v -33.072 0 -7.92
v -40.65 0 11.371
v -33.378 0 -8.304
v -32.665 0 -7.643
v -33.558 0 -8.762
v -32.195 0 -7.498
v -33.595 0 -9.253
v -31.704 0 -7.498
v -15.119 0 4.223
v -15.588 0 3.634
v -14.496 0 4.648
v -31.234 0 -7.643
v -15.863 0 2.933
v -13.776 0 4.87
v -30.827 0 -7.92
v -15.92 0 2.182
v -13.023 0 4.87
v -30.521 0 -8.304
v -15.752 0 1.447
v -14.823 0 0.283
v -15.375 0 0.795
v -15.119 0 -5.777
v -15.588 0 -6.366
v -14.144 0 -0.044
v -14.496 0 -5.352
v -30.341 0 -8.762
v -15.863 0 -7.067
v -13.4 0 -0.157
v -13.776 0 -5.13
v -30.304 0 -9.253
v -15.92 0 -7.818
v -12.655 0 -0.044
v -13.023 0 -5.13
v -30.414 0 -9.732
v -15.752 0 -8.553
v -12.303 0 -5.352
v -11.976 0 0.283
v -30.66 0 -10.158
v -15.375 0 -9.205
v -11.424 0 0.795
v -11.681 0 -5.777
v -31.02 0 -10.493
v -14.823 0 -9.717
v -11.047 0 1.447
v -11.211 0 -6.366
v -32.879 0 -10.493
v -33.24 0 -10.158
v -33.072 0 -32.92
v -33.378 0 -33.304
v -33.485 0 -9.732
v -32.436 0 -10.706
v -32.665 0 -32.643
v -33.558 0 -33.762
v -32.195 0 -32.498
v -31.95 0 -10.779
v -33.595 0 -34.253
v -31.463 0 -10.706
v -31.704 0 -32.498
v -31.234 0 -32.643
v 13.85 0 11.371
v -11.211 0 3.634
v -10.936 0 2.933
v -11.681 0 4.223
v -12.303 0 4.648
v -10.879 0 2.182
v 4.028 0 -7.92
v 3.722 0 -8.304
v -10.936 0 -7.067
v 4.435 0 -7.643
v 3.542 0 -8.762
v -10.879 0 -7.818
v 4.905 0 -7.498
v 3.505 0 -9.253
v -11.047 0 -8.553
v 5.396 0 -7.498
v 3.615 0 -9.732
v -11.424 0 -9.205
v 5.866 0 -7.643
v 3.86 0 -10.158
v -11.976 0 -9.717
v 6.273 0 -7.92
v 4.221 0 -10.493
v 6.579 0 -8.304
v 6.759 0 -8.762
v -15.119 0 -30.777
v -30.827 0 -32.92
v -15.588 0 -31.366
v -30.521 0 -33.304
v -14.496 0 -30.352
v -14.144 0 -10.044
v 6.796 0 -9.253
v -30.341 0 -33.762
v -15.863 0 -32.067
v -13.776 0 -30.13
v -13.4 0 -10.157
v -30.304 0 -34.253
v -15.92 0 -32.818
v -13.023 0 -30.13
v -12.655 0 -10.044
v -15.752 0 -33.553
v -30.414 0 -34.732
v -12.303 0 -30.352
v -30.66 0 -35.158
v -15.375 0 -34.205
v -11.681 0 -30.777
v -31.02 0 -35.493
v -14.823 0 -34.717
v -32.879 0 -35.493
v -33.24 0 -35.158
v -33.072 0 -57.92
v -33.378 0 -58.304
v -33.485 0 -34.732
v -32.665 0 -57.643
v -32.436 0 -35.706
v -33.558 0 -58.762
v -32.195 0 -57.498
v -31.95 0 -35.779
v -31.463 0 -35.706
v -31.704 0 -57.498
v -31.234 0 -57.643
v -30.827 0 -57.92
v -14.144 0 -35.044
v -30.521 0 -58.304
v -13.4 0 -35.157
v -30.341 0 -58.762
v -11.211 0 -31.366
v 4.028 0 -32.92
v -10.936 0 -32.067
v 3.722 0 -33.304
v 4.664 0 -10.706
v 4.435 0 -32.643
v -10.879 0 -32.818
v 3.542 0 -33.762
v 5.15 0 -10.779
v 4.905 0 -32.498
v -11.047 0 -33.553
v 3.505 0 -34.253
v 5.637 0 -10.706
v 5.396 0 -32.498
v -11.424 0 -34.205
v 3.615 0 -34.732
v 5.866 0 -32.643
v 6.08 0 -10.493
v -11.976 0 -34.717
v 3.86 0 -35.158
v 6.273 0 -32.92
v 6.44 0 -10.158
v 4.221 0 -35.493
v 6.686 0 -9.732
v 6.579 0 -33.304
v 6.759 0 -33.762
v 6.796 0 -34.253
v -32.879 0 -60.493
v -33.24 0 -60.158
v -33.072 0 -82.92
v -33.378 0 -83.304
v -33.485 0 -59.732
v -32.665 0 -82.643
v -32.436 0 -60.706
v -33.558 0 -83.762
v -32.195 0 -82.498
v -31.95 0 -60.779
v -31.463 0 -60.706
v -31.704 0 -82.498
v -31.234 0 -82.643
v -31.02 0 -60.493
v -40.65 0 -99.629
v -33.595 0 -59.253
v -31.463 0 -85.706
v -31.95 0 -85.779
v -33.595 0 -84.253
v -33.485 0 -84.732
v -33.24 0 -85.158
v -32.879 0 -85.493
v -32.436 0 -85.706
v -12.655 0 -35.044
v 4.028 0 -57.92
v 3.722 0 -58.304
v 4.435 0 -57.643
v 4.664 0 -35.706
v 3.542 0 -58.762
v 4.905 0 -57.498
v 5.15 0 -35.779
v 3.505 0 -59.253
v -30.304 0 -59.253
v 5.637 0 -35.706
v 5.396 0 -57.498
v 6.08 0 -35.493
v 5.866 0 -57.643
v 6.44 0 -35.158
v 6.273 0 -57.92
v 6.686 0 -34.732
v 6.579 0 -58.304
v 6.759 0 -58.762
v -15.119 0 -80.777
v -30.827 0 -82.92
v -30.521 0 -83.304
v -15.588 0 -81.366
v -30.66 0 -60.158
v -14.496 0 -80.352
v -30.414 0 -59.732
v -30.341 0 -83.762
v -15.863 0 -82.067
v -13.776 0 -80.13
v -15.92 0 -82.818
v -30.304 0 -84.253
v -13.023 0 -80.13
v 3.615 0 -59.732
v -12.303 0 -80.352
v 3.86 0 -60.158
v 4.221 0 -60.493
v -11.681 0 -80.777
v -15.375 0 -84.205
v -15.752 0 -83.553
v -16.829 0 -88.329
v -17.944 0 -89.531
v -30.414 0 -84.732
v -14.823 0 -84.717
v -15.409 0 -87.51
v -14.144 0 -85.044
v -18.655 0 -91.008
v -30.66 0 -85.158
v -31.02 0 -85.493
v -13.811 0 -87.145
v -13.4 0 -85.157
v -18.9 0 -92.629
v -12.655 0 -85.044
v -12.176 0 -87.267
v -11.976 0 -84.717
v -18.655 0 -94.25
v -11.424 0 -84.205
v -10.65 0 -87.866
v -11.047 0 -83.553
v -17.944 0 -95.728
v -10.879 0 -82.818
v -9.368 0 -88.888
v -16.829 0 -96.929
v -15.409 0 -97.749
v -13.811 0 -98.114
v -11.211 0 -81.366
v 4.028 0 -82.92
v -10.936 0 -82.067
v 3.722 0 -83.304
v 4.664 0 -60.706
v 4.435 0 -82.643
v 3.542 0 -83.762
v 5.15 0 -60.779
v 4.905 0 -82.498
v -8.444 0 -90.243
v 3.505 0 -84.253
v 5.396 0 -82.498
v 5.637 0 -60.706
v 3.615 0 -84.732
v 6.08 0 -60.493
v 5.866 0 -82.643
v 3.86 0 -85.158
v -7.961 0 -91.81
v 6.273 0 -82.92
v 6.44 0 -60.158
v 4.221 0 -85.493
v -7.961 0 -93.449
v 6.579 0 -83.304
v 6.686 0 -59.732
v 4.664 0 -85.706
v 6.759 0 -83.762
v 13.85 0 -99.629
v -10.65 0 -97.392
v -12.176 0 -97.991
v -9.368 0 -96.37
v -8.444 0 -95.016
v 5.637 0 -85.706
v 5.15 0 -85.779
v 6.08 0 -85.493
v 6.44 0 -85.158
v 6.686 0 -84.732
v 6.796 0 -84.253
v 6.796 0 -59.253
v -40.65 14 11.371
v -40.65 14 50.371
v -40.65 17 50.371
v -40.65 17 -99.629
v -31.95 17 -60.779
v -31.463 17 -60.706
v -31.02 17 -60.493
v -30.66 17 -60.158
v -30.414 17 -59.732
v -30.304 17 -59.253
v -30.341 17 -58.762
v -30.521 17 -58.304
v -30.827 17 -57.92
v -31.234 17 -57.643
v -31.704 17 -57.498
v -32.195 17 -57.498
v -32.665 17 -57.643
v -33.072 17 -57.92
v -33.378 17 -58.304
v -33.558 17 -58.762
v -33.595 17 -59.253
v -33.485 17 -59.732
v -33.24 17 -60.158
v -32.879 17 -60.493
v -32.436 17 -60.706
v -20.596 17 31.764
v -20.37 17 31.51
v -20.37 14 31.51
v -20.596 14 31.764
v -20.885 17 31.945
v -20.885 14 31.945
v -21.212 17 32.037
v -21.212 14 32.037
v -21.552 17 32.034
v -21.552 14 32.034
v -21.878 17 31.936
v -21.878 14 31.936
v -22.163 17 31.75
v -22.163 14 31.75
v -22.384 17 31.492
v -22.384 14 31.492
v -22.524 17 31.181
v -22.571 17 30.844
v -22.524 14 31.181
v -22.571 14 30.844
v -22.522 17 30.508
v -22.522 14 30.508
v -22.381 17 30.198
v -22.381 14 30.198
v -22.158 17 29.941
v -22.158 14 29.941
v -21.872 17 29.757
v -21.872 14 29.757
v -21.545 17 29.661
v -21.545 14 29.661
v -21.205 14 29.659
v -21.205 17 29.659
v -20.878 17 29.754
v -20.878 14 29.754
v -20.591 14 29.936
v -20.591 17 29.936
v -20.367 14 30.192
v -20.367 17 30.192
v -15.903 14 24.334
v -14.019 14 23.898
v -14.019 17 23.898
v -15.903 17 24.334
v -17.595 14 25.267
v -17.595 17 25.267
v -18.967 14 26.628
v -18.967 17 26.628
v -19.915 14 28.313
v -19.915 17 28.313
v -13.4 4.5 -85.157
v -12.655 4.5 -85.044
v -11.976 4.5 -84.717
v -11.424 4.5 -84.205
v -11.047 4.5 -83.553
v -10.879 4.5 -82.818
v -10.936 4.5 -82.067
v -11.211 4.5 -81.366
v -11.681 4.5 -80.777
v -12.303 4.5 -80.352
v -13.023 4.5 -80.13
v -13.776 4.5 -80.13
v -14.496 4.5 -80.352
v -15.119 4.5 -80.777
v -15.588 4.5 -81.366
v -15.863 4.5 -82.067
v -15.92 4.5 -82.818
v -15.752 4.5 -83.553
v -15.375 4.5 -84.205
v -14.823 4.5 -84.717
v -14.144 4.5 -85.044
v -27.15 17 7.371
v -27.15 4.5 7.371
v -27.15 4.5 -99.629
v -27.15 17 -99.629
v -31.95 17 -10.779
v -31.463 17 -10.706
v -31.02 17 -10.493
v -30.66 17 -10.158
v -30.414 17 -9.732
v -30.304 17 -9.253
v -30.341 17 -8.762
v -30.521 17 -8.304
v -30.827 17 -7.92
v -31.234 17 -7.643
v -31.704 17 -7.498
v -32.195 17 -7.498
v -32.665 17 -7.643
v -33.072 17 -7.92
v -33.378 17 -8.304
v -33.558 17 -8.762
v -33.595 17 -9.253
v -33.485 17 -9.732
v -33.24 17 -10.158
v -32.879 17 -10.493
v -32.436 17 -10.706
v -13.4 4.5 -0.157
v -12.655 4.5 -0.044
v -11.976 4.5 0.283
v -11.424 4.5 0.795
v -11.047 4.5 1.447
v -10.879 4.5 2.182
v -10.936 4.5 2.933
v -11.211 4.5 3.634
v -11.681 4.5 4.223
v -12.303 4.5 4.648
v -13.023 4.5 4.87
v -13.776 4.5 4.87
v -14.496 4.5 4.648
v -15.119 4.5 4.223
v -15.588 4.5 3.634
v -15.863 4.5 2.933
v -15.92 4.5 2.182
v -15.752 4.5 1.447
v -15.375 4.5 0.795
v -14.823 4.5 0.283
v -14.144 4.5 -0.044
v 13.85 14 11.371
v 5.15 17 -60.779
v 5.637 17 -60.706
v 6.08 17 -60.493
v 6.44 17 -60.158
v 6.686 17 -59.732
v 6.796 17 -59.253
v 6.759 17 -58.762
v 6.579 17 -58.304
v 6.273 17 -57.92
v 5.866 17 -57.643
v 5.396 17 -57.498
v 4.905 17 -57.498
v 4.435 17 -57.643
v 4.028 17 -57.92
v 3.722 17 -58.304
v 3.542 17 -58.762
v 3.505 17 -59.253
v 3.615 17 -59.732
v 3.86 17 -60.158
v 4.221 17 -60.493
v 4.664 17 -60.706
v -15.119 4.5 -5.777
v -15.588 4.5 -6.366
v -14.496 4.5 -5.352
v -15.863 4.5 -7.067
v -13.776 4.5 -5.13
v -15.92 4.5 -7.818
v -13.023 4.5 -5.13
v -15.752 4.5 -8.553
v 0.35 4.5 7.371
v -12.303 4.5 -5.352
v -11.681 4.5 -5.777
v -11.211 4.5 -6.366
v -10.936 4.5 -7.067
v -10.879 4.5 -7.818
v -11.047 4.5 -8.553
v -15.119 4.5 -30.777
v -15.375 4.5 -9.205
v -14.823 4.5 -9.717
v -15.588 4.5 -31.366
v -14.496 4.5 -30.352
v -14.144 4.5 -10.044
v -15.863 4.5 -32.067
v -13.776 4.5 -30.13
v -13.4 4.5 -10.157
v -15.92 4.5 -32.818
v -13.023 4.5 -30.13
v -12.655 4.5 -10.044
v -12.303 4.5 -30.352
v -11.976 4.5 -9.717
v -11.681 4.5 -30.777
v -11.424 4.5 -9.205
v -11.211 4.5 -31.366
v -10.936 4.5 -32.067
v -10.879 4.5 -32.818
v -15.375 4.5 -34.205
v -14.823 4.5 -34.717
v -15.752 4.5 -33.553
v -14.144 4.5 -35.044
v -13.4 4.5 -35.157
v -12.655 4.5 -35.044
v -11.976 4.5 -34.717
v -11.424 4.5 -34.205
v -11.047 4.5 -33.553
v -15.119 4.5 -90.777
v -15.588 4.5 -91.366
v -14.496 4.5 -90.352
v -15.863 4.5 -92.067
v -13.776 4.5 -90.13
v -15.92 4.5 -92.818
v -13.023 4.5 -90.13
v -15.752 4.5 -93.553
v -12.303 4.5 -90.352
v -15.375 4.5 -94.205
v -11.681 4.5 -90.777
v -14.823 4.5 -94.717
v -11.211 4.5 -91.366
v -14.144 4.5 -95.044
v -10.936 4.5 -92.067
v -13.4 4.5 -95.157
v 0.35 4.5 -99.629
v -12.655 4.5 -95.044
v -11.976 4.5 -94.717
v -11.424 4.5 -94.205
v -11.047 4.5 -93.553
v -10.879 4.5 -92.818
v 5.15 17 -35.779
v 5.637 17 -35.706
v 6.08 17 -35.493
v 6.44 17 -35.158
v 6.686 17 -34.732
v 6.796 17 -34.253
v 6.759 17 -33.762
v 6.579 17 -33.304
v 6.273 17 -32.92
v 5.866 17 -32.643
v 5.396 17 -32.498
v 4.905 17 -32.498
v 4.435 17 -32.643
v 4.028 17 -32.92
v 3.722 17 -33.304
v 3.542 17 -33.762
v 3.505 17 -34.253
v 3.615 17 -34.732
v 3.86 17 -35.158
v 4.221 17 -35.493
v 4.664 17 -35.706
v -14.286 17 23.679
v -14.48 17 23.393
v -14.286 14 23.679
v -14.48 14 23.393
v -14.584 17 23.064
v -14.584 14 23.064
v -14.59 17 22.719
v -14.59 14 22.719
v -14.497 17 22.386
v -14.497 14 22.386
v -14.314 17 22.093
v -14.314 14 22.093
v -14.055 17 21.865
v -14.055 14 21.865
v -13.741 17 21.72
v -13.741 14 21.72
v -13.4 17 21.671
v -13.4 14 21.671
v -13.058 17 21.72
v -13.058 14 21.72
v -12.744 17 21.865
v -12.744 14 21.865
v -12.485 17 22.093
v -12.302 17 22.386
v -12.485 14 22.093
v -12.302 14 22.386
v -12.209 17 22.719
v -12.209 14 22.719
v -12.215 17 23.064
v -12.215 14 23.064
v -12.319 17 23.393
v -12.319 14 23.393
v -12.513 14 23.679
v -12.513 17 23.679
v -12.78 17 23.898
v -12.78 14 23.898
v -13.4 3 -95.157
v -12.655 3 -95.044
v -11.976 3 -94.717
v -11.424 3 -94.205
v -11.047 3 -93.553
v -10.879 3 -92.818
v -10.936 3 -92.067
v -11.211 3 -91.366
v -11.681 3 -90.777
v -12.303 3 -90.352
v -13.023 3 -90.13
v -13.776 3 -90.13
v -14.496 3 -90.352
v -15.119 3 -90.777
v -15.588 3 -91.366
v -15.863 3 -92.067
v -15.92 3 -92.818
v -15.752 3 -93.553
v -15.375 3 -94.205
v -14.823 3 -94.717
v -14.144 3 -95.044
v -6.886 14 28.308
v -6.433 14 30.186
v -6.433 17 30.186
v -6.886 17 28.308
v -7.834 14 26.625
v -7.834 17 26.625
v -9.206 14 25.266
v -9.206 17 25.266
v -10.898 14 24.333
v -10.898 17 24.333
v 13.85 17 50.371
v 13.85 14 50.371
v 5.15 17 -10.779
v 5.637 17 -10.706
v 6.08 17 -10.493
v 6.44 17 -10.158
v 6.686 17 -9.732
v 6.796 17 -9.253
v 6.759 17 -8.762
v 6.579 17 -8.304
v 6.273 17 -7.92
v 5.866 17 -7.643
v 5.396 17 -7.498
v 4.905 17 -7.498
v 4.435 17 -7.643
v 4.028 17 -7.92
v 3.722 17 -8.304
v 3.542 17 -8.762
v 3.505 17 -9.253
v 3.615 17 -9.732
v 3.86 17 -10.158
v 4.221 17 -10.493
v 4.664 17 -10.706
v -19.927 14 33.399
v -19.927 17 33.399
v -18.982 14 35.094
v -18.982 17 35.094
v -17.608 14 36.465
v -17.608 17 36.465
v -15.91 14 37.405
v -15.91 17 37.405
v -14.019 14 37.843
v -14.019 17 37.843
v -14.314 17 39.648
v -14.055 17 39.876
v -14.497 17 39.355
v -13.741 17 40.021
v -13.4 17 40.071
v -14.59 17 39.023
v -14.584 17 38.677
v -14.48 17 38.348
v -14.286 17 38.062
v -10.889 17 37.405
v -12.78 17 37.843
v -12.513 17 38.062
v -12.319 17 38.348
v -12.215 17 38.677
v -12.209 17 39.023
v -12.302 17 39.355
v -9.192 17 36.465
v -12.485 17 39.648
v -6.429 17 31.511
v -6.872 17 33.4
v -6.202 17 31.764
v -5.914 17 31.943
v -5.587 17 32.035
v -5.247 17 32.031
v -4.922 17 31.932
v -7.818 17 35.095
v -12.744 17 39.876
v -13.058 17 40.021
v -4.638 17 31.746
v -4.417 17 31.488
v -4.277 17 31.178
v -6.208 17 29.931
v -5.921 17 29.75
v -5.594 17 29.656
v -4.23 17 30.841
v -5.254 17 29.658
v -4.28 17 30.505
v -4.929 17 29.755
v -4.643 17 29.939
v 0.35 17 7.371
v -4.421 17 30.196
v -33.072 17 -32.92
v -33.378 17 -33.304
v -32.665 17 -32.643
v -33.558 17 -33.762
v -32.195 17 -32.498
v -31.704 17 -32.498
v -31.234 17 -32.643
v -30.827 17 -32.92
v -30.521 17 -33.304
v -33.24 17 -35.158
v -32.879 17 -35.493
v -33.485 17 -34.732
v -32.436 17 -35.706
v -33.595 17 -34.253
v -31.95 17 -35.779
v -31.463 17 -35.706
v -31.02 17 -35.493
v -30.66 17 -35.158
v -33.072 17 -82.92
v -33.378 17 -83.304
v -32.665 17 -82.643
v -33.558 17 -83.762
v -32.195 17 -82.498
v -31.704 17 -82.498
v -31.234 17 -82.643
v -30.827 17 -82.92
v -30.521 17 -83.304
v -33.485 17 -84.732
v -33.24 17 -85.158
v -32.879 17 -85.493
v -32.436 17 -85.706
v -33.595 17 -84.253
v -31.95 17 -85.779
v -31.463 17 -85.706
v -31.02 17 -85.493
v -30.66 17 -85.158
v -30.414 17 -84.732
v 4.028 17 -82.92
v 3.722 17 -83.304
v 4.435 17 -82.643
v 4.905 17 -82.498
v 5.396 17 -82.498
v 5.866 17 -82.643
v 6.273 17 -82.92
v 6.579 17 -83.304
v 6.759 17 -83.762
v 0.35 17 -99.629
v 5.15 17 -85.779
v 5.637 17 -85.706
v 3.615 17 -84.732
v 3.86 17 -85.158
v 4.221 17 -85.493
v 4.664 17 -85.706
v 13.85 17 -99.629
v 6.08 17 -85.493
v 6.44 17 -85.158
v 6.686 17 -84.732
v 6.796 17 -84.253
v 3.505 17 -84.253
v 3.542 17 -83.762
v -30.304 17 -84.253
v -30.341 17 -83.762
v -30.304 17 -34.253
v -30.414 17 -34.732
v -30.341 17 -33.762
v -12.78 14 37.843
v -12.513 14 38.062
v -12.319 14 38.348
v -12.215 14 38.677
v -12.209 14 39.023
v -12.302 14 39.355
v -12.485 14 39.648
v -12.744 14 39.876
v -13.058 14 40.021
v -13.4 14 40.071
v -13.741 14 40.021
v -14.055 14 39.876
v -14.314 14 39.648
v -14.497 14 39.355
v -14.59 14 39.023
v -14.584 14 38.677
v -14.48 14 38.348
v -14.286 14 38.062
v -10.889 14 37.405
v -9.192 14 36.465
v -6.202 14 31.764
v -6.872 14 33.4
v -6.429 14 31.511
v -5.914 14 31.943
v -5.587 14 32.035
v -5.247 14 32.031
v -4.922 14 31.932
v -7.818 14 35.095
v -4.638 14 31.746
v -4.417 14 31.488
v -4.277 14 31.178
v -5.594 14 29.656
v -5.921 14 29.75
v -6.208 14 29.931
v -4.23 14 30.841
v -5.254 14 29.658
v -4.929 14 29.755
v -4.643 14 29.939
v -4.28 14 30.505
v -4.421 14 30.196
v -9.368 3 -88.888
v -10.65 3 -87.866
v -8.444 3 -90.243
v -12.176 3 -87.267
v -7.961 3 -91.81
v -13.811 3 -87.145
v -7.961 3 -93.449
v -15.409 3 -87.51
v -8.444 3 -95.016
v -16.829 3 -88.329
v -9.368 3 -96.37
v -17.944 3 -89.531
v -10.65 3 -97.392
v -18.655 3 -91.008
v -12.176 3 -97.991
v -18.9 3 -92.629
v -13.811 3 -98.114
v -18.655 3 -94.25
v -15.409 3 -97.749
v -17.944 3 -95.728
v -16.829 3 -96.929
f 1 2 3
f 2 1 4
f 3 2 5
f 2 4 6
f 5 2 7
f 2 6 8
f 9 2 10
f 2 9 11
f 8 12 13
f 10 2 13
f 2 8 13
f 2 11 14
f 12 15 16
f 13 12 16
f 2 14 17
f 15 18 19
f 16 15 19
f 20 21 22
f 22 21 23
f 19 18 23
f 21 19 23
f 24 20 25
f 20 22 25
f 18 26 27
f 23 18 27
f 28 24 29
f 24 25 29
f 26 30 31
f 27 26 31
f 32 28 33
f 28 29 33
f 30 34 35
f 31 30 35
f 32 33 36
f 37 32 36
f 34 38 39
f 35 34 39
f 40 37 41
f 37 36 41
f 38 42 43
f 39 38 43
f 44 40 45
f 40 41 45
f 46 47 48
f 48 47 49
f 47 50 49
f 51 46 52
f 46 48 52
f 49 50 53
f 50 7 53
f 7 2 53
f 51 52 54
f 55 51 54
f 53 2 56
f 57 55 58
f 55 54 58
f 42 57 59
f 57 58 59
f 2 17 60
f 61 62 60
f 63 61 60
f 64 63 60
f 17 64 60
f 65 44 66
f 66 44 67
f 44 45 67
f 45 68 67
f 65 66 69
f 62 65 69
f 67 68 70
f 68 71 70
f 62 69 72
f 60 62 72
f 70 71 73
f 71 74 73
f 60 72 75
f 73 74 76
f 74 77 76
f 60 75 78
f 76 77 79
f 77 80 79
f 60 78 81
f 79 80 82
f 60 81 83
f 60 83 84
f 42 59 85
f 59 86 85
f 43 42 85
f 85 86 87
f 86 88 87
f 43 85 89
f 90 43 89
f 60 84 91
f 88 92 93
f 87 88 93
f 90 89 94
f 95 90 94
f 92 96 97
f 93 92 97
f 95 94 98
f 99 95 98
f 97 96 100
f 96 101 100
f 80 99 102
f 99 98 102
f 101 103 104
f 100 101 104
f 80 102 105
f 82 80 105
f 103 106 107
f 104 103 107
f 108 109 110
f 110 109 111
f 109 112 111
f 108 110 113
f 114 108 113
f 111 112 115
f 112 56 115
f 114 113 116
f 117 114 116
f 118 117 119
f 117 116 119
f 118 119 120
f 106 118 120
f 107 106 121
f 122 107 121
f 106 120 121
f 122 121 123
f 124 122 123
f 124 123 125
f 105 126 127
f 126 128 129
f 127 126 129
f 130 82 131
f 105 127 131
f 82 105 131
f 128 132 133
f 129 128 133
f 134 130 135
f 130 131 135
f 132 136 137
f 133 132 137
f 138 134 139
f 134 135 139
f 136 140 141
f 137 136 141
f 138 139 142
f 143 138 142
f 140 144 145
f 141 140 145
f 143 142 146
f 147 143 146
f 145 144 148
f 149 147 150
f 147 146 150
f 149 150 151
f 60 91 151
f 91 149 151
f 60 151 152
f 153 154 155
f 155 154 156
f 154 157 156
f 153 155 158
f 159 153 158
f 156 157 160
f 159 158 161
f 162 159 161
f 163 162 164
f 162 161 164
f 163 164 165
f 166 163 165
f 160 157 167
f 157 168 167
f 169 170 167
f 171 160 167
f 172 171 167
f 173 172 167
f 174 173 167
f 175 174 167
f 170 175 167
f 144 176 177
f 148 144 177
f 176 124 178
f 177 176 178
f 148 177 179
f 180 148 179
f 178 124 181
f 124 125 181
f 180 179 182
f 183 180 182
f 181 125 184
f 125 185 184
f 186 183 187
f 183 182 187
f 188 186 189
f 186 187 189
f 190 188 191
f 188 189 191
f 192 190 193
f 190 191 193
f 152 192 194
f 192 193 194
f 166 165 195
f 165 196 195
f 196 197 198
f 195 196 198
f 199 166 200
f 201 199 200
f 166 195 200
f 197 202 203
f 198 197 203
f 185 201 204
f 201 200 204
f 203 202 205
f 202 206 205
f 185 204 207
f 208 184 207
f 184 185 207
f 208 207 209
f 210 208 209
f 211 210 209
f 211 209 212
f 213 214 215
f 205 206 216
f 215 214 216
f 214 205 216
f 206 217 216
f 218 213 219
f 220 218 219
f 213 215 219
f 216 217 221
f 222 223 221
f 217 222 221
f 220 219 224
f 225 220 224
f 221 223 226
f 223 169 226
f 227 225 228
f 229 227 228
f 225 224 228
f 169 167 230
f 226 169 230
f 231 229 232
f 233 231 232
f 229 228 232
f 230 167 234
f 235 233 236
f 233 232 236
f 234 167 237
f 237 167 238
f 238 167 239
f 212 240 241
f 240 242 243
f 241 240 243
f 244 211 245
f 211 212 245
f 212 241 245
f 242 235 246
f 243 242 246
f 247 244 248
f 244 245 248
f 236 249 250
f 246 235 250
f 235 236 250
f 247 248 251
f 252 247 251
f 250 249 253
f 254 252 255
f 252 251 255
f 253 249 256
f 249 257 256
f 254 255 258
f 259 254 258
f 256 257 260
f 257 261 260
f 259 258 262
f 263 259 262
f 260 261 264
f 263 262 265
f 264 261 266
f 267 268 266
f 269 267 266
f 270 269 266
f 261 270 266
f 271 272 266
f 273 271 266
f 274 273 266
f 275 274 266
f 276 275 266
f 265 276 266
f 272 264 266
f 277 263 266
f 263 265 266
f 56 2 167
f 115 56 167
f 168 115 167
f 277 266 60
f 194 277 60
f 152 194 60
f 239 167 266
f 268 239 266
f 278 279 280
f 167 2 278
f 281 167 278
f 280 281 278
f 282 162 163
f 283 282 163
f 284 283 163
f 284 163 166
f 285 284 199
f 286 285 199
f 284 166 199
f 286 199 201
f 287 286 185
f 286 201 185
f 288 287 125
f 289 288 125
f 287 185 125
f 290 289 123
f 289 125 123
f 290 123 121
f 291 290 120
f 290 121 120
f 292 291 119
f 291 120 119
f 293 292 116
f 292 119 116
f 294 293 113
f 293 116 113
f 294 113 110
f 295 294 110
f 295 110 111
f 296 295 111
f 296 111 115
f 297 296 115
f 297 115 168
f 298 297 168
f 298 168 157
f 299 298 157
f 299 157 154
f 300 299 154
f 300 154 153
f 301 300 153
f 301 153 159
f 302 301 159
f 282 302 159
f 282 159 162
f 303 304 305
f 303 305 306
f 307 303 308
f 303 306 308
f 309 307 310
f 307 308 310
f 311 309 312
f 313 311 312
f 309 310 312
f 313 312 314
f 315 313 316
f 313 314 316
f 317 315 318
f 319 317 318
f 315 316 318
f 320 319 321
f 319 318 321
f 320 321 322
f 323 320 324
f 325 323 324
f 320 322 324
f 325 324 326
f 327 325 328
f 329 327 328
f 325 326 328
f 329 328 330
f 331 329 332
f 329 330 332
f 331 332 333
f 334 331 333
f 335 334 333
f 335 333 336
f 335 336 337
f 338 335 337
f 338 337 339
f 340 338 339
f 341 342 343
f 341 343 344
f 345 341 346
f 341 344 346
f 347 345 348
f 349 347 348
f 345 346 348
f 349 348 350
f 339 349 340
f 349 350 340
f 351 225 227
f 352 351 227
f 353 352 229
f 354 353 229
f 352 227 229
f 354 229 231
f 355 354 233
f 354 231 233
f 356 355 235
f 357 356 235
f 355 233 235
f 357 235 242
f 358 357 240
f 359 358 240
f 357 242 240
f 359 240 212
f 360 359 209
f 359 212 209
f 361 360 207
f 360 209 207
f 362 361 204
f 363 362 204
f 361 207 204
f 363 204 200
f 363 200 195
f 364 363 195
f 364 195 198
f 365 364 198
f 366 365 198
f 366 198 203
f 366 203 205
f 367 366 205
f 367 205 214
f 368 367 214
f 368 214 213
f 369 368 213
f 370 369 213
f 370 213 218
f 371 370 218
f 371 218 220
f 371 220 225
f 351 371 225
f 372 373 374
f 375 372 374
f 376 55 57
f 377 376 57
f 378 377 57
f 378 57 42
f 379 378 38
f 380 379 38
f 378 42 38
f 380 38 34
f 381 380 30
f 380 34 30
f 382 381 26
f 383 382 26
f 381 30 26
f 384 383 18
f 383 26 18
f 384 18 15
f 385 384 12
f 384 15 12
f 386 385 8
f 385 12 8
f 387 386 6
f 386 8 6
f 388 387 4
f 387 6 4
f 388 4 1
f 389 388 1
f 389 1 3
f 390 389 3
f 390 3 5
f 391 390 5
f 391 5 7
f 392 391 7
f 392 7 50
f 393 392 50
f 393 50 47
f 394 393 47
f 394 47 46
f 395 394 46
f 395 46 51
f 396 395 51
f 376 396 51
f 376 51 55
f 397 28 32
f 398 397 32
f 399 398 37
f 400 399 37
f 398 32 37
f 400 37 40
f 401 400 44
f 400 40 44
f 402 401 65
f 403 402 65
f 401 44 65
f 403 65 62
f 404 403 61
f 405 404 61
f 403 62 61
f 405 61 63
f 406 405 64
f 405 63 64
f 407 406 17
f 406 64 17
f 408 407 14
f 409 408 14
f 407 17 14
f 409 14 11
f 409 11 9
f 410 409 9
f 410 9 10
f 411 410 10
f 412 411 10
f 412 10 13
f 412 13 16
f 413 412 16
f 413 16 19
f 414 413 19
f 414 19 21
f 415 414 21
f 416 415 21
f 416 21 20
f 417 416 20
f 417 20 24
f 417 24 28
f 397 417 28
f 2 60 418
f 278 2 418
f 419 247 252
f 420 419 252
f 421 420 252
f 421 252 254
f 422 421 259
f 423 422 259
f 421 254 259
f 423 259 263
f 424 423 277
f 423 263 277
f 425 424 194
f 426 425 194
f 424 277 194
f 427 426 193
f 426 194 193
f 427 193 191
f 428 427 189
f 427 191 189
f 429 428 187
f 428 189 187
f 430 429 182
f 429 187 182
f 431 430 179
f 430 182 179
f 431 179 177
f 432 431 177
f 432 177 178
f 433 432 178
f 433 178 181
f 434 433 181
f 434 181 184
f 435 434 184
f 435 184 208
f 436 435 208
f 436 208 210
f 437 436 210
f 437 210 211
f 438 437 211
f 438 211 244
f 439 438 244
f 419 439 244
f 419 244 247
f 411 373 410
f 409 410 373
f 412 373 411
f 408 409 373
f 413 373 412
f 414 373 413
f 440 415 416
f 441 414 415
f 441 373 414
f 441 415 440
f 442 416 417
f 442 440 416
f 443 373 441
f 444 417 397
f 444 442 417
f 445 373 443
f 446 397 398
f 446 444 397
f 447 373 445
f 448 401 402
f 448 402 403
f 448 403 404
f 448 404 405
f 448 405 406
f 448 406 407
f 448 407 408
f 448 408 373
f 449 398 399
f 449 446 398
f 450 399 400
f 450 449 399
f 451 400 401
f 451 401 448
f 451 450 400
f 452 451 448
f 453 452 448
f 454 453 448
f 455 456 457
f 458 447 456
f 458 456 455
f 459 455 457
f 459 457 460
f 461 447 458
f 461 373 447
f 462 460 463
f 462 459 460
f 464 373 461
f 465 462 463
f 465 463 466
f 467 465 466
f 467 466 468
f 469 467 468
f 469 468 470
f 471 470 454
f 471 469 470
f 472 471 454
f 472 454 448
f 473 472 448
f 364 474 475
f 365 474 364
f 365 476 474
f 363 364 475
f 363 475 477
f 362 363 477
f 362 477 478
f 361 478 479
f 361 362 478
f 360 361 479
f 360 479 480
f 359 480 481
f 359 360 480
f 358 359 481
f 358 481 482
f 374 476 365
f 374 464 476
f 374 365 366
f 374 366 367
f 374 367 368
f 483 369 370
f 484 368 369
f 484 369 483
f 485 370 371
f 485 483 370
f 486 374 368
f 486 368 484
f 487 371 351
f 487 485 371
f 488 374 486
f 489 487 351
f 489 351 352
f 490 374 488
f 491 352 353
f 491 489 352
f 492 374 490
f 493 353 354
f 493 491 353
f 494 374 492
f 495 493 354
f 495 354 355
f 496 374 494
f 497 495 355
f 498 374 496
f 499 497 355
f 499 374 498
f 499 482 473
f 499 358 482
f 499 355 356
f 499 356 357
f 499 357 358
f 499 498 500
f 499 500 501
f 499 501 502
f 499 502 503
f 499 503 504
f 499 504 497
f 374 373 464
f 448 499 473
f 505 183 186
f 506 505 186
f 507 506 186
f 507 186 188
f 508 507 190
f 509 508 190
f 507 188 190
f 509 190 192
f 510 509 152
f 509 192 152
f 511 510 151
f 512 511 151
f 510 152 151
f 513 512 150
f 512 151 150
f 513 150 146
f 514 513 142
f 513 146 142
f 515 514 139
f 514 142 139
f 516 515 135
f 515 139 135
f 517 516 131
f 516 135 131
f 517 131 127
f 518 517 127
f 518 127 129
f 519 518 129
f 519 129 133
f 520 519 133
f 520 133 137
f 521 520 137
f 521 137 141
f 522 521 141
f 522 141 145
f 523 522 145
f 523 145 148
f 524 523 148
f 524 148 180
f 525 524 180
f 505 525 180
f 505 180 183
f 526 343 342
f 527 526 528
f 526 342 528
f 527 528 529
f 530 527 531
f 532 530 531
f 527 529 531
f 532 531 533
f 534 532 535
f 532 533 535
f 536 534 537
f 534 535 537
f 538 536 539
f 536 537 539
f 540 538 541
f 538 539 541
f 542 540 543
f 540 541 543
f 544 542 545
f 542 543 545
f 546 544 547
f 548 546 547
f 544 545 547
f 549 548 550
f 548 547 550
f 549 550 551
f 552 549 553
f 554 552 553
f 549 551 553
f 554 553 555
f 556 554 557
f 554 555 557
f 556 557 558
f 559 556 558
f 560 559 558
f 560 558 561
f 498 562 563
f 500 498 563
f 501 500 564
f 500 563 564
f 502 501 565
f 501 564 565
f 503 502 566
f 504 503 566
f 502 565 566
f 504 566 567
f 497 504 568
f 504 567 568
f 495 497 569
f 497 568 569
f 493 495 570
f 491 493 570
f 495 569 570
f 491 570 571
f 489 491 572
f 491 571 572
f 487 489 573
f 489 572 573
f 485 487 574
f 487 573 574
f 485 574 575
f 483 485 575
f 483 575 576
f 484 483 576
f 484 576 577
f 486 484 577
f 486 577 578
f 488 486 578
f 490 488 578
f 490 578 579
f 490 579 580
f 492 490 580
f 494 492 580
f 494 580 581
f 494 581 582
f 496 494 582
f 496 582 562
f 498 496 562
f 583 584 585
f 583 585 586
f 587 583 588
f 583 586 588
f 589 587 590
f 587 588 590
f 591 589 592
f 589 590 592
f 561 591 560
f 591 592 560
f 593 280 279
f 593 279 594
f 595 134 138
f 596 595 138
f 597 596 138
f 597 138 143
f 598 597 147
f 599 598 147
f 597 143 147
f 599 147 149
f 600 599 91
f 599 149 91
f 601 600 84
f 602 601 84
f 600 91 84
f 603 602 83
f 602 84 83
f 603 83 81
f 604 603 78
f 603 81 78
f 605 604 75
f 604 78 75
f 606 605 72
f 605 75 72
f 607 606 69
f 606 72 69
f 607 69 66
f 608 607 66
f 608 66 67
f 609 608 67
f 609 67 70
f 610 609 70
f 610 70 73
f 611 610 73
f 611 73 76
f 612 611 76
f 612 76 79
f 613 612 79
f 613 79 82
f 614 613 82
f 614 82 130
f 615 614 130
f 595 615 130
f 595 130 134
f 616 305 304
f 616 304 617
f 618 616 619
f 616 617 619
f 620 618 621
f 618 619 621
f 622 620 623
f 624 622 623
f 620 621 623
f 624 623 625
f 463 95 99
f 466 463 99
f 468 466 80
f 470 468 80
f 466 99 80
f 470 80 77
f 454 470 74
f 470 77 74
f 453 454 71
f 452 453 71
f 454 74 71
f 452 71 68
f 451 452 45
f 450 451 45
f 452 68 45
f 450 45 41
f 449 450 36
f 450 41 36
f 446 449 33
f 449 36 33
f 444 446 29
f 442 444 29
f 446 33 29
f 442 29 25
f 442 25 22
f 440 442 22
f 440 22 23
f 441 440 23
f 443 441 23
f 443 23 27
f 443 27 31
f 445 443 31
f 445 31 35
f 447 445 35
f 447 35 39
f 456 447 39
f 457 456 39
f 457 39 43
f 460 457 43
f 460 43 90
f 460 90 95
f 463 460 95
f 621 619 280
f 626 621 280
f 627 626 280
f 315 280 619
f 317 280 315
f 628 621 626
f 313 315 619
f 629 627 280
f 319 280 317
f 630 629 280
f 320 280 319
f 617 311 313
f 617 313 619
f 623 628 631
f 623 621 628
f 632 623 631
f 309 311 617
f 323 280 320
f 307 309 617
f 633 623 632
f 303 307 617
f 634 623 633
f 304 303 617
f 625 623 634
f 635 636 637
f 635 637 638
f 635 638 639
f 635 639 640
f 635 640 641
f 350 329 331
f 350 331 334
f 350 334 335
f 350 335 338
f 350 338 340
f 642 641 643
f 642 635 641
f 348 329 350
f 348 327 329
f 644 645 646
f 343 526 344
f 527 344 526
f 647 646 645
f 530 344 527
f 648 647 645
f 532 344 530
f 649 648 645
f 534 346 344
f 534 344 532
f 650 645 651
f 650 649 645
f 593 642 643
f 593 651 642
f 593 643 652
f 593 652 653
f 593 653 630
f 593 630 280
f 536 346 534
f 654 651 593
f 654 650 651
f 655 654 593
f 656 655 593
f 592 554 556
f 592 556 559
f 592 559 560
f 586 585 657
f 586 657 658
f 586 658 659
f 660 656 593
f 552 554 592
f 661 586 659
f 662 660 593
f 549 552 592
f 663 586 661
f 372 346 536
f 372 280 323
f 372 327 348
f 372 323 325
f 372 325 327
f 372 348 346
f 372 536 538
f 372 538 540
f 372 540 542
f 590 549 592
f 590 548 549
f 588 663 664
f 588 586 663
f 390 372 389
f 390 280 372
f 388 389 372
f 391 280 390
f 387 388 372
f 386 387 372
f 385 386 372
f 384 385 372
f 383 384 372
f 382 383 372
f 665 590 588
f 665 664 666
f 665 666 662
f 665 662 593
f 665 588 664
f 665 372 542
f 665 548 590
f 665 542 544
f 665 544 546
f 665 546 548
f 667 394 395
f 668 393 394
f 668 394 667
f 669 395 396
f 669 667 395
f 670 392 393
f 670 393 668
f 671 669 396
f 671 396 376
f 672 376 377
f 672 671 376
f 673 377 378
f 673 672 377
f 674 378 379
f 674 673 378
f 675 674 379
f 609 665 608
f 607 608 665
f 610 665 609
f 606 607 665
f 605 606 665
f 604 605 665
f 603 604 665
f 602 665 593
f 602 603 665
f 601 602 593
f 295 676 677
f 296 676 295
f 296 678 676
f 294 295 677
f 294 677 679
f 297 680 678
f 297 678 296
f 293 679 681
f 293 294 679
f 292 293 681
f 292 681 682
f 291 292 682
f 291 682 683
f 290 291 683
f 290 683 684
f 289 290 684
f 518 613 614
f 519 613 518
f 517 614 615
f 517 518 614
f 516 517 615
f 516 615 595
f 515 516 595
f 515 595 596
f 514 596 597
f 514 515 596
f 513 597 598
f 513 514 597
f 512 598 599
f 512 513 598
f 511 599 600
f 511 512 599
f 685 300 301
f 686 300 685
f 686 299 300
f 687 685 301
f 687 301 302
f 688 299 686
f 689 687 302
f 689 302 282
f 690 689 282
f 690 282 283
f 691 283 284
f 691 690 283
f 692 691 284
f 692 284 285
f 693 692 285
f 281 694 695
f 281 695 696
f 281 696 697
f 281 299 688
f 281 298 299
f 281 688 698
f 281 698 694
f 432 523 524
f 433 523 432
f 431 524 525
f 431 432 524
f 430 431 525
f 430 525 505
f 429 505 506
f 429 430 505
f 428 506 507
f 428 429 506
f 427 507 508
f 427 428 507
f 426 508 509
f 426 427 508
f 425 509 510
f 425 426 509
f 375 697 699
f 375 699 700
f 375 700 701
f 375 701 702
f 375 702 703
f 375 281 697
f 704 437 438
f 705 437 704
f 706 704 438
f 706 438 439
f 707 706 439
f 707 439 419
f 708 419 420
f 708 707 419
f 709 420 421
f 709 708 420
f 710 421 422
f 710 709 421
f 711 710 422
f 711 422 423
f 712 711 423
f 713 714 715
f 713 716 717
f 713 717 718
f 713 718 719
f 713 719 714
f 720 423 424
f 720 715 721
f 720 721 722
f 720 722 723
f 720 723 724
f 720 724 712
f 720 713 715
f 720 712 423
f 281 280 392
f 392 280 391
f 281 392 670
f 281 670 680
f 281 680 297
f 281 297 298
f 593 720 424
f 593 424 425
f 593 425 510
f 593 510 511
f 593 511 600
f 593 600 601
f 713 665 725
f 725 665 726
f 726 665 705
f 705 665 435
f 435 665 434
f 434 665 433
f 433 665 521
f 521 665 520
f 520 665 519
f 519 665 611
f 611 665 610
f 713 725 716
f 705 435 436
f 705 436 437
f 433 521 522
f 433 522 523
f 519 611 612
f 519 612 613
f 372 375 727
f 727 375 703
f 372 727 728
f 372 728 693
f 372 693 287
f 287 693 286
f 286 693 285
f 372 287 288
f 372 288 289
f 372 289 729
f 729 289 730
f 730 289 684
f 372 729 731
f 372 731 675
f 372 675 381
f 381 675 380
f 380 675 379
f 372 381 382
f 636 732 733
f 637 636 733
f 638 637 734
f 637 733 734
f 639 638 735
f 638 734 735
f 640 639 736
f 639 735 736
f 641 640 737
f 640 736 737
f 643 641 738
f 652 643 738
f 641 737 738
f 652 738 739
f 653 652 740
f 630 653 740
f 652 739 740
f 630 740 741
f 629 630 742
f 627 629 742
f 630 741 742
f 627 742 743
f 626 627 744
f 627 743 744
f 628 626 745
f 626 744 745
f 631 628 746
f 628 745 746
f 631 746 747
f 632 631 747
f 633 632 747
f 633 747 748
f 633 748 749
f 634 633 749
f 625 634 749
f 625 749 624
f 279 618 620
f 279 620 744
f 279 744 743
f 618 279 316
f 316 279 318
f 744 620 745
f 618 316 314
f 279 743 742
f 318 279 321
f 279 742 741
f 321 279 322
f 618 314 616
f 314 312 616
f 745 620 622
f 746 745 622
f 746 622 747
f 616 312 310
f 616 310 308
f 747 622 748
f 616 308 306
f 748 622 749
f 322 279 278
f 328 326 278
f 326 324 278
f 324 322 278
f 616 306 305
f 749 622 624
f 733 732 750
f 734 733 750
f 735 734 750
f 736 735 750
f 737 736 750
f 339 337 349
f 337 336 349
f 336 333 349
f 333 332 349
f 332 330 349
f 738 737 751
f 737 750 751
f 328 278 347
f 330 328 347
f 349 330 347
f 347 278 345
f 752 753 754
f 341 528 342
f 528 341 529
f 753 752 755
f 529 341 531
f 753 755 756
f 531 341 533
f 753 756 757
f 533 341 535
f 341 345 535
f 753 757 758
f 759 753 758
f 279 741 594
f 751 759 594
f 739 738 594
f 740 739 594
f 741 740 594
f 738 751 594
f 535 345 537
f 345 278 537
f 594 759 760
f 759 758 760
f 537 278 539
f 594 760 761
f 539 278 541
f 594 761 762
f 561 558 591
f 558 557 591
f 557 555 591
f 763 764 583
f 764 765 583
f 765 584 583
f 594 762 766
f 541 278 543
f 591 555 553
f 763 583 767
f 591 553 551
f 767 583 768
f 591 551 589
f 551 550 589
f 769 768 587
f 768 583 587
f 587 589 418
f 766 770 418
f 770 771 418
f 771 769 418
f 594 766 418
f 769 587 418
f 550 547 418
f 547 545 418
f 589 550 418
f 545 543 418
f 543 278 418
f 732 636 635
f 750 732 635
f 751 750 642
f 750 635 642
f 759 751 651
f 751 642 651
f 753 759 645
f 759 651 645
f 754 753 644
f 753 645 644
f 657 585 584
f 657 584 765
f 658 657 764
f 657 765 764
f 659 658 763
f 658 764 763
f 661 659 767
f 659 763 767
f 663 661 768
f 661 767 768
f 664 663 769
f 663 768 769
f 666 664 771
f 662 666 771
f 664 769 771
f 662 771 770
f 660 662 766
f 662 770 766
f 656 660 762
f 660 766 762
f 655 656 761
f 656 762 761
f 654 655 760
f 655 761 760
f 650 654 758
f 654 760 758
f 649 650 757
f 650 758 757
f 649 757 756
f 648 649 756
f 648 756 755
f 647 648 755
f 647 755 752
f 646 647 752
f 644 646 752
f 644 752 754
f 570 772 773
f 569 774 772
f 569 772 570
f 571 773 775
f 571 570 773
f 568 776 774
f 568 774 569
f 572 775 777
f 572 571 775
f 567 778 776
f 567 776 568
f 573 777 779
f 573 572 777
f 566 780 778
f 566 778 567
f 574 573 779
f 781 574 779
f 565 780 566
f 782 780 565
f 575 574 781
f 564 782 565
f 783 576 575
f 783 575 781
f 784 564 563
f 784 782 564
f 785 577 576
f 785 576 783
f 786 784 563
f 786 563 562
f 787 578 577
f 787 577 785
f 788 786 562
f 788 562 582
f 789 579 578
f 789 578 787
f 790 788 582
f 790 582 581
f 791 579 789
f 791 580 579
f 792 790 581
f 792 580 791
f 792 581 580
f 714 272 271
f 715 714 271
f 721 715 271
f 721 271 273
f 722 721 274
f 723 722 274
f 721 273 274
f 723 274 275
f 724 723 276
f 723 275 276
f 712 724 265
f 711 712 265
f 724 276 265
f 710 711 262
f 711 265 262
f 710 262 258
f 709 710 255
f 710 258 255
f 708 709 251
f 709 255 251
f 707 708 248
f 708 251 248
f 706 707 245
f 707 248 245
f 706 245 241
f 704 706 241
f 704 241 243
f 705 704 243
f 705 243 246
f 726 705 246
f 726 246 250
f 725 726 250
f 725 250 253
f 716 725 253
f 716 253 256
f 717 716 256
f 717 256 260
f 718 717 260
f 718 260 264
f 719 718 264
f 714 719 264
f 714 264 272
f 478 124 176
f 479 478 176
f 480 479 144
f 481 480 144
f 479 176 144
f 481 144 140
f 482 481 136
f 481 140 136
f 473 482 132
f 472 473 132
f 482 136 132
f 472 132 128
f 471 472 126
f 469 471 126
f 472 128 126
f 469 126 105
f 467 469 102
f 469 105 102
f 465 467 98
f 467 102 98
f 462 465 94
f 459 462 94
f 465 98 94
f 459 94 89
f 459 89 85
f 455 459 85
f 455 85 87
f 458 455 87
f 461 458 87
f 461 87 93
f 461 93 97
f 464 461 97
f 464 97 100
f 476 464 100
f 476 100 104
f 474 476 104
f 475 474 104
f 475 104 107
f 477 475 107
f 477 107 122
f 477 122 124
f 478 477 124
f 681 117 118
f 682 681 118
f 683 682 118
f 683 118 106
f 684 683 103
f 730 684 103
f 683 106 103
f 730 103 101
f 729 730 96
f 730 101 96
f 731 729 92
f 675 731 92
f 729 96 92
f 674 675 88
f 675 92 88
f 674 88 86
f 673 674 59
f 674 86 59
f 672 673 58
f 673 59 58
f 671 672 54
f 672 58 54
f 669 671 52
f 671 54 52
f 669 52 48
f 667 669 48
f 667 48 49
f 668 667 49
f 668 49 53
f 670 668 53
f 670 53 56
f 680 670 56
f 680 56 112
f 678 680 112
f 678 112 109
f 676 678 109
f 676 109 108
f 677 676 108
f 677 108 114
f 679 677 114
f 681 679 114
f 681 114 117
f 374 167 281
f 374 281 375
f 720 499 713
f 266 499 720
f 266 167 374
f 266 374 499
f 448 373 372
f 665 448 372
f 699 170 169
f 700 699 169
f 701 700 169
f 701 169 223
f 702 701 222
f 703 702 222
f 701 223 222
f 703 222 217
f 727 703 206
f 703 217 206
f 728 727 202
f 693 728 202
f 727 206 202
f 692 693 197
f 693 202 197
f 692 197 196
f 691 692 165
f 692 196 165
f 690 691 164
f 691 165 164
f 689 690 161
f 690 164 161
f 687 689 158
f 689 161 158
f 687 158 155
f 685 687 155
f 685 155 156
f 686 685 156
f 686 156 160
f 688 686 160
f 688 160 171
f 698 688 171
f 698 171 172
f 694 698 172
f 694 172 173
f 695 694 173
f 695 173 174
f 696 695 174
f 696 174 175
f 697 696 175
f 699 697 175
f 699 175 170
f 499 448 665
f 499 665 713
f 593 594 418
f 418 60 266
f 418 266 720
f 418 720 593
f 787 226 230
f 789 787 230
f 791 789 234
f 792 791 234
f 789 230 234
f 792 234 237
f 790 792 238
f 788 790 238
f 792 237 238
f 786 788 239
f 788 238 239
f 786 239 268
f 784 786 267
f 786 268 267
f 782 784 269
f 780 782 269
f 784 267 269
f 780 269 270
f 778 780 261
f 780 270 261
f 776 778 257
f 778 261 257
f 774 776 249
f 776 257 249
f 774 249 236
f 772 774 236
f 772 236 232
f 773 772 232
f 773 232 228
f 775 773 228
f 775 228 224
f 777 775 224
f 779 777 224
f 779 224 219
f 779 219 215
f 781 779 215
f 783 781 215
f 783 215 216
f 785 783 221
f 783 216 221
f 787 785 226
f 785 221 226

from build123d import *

# Parameters (mm, degrees)
SKETCH1_W                  = 54.5
SKETCH1_H                  = 111
BOSS_EXTRUDE1_DEPTH        = 4.5
SKETCH2_W                  = 13.5
SKETCH2_H                  = 111
BOSS_EXTRUDE2_DEPTH        = 12.5
M4X0_7_TAPPED_HOLE1_D      = 3.3
SKETCH6_W                  = 4
SKETCH6_H                  = 12.5
BOSS_EXTRUDE3_DEPTH        = 37
SKETCH7_W                  = 54.5
SKETCH7_H                  = 3
BOSS_EXTRUDE5_DEPTH        = 39
SKETCH8_R                  = 7
CUT_EXTRUDE1_DEPTH         = 3
M2_CLEARANCE_HOLE1_D       = 2.4
F_8_0_199_DIAMETER_HOLE1_D = 5.0546
SKETCH12_R                 = 5.5
CUT_EXTRUDE3_DEPTH         = 3


with BuildPart() as part:
    # Sketch1 → Boss-Extrude1 (new body)
    with BuildSketch(Plane(origin=(0, 0, 0), x_dir=(1, 0, 0), z_dir=(0, 1, 0))):
        with Locations((-13.399543841, 44.129312584)):
            Rectangle(SKETCH1_W, SKETCH1_H)
    extrude(amount=BOSS_EXTRUDE1_DEPTH)

    # Sketch2 → Boss-Extrude2 (add)
    with BuildSketch(Plane(origin=(0, 4.5, 0), x_dir=(1, 0, 0), z_dir=(0, 1, 0))):
        with Locations((7.100456159, 44.129312584)):
            Rectangle(SKETCH2_W, SKETCH2_H)
        with Locations((-33.899543841, 44.129312584)):
            Rectangle(SKETCH2_W, SKETCH2_H)
    extrude(amount=BOSS_EXTRUDE2_DEPTH)

    # M4x0.7 Tapped Hole1 (through all)
    with Locations(Plane(origin=(-31.949543841, 17, -9.129312584), x_dir=(0, 0, 1), z_dir=(0, 1, 0))):
        with Locations((0, 0), (-25, 0), (-50, 0), (-75, 0), (0, 37.1), (-25, 37.1), (-50, 37.1), (-75, 37.1)):
            Hole(M4X0_7_TAPPED_HOLE1_D / 2)

    # Sketch6 → Boss-Extrude3 (add)
    with BuildSketch(Plane(origin=(-27.149543841, 0, 0), x_dir=(0, 0, -1), z_dir=(1, 0, 0))):
        with Locations((-9.370687416, 10.75)):
            Rectangle(SKETCH6_W, SKETCH6_H)
    extrude(amount=BOSS_EXTRUDE3_DEPTH)

    # Sketch7 → Boss-Extrude5 (add)
    with BuildSketch(Plane.XY.offset(11.370687416)):
        with Locations((-13.399543841, 15.5)):
            Rectangle(SKETCH7_W, SKETCH7_H)
    extrude(amount=BOSS_EXTRUDE5_DEPTH)

    # Sketch8 → Cut-Extrude1 (cut)
    with BuildSketch(Plane(origin=(0, 17, 0), x_dir=(1, 0, 0), z_dir=(0, 1, 0))):
        with Locations((-13.399543841, -30.870687416)):
            Circle(SKETCH8_R)
    extrude(amount=-CUT_EXTRUDE1_DEPTH, mode=Mode.SUBTRACT)

    # M2 Clearance Hole1 (through all)
    with Locations(Plane(origin=(-21.371437118, 17, 30.847906254), x_dir=(0, 0, 1), z_dir=(0, 1, 0))):
        with Locations((0, 0), (-7.977218838, 7.971893277), (8.022781162, 7.971893277), (-0.002806072, 15.940961576)):
            Hole(M2_CLEARANCE_HOLE1_D / 2)

    # #8 (0.199) Diameter Hole1 (through all)
    with Locations(Plane(origin=(-13.399543841, 4.5, 2.370687416), x_dir=(0, 0, 1), z_dir=(0, 1, 0))):
        with Locations((0, 0), (-10, 0), (-35, 0), (-85, 0), (-95, 0)):
            Hole(F_8_0_199_DIAMETER_HOLE1_D / 2)

    # Sketch12 → Cut-Extrude3 (cut)
    with BuildSketch(Plane(origin=(0, 0, 0), x_dir=(-1, 0, 0), z_dir=(0, -1, 0))):
        with Locations((13.399543841, 92.629312584)):
            Circle(SKETCH12_R)
    extrude(amount=-CUT_EXTRUDE3_DEPTH, mode=Mode.SUBTRACT)


solid = part.part
